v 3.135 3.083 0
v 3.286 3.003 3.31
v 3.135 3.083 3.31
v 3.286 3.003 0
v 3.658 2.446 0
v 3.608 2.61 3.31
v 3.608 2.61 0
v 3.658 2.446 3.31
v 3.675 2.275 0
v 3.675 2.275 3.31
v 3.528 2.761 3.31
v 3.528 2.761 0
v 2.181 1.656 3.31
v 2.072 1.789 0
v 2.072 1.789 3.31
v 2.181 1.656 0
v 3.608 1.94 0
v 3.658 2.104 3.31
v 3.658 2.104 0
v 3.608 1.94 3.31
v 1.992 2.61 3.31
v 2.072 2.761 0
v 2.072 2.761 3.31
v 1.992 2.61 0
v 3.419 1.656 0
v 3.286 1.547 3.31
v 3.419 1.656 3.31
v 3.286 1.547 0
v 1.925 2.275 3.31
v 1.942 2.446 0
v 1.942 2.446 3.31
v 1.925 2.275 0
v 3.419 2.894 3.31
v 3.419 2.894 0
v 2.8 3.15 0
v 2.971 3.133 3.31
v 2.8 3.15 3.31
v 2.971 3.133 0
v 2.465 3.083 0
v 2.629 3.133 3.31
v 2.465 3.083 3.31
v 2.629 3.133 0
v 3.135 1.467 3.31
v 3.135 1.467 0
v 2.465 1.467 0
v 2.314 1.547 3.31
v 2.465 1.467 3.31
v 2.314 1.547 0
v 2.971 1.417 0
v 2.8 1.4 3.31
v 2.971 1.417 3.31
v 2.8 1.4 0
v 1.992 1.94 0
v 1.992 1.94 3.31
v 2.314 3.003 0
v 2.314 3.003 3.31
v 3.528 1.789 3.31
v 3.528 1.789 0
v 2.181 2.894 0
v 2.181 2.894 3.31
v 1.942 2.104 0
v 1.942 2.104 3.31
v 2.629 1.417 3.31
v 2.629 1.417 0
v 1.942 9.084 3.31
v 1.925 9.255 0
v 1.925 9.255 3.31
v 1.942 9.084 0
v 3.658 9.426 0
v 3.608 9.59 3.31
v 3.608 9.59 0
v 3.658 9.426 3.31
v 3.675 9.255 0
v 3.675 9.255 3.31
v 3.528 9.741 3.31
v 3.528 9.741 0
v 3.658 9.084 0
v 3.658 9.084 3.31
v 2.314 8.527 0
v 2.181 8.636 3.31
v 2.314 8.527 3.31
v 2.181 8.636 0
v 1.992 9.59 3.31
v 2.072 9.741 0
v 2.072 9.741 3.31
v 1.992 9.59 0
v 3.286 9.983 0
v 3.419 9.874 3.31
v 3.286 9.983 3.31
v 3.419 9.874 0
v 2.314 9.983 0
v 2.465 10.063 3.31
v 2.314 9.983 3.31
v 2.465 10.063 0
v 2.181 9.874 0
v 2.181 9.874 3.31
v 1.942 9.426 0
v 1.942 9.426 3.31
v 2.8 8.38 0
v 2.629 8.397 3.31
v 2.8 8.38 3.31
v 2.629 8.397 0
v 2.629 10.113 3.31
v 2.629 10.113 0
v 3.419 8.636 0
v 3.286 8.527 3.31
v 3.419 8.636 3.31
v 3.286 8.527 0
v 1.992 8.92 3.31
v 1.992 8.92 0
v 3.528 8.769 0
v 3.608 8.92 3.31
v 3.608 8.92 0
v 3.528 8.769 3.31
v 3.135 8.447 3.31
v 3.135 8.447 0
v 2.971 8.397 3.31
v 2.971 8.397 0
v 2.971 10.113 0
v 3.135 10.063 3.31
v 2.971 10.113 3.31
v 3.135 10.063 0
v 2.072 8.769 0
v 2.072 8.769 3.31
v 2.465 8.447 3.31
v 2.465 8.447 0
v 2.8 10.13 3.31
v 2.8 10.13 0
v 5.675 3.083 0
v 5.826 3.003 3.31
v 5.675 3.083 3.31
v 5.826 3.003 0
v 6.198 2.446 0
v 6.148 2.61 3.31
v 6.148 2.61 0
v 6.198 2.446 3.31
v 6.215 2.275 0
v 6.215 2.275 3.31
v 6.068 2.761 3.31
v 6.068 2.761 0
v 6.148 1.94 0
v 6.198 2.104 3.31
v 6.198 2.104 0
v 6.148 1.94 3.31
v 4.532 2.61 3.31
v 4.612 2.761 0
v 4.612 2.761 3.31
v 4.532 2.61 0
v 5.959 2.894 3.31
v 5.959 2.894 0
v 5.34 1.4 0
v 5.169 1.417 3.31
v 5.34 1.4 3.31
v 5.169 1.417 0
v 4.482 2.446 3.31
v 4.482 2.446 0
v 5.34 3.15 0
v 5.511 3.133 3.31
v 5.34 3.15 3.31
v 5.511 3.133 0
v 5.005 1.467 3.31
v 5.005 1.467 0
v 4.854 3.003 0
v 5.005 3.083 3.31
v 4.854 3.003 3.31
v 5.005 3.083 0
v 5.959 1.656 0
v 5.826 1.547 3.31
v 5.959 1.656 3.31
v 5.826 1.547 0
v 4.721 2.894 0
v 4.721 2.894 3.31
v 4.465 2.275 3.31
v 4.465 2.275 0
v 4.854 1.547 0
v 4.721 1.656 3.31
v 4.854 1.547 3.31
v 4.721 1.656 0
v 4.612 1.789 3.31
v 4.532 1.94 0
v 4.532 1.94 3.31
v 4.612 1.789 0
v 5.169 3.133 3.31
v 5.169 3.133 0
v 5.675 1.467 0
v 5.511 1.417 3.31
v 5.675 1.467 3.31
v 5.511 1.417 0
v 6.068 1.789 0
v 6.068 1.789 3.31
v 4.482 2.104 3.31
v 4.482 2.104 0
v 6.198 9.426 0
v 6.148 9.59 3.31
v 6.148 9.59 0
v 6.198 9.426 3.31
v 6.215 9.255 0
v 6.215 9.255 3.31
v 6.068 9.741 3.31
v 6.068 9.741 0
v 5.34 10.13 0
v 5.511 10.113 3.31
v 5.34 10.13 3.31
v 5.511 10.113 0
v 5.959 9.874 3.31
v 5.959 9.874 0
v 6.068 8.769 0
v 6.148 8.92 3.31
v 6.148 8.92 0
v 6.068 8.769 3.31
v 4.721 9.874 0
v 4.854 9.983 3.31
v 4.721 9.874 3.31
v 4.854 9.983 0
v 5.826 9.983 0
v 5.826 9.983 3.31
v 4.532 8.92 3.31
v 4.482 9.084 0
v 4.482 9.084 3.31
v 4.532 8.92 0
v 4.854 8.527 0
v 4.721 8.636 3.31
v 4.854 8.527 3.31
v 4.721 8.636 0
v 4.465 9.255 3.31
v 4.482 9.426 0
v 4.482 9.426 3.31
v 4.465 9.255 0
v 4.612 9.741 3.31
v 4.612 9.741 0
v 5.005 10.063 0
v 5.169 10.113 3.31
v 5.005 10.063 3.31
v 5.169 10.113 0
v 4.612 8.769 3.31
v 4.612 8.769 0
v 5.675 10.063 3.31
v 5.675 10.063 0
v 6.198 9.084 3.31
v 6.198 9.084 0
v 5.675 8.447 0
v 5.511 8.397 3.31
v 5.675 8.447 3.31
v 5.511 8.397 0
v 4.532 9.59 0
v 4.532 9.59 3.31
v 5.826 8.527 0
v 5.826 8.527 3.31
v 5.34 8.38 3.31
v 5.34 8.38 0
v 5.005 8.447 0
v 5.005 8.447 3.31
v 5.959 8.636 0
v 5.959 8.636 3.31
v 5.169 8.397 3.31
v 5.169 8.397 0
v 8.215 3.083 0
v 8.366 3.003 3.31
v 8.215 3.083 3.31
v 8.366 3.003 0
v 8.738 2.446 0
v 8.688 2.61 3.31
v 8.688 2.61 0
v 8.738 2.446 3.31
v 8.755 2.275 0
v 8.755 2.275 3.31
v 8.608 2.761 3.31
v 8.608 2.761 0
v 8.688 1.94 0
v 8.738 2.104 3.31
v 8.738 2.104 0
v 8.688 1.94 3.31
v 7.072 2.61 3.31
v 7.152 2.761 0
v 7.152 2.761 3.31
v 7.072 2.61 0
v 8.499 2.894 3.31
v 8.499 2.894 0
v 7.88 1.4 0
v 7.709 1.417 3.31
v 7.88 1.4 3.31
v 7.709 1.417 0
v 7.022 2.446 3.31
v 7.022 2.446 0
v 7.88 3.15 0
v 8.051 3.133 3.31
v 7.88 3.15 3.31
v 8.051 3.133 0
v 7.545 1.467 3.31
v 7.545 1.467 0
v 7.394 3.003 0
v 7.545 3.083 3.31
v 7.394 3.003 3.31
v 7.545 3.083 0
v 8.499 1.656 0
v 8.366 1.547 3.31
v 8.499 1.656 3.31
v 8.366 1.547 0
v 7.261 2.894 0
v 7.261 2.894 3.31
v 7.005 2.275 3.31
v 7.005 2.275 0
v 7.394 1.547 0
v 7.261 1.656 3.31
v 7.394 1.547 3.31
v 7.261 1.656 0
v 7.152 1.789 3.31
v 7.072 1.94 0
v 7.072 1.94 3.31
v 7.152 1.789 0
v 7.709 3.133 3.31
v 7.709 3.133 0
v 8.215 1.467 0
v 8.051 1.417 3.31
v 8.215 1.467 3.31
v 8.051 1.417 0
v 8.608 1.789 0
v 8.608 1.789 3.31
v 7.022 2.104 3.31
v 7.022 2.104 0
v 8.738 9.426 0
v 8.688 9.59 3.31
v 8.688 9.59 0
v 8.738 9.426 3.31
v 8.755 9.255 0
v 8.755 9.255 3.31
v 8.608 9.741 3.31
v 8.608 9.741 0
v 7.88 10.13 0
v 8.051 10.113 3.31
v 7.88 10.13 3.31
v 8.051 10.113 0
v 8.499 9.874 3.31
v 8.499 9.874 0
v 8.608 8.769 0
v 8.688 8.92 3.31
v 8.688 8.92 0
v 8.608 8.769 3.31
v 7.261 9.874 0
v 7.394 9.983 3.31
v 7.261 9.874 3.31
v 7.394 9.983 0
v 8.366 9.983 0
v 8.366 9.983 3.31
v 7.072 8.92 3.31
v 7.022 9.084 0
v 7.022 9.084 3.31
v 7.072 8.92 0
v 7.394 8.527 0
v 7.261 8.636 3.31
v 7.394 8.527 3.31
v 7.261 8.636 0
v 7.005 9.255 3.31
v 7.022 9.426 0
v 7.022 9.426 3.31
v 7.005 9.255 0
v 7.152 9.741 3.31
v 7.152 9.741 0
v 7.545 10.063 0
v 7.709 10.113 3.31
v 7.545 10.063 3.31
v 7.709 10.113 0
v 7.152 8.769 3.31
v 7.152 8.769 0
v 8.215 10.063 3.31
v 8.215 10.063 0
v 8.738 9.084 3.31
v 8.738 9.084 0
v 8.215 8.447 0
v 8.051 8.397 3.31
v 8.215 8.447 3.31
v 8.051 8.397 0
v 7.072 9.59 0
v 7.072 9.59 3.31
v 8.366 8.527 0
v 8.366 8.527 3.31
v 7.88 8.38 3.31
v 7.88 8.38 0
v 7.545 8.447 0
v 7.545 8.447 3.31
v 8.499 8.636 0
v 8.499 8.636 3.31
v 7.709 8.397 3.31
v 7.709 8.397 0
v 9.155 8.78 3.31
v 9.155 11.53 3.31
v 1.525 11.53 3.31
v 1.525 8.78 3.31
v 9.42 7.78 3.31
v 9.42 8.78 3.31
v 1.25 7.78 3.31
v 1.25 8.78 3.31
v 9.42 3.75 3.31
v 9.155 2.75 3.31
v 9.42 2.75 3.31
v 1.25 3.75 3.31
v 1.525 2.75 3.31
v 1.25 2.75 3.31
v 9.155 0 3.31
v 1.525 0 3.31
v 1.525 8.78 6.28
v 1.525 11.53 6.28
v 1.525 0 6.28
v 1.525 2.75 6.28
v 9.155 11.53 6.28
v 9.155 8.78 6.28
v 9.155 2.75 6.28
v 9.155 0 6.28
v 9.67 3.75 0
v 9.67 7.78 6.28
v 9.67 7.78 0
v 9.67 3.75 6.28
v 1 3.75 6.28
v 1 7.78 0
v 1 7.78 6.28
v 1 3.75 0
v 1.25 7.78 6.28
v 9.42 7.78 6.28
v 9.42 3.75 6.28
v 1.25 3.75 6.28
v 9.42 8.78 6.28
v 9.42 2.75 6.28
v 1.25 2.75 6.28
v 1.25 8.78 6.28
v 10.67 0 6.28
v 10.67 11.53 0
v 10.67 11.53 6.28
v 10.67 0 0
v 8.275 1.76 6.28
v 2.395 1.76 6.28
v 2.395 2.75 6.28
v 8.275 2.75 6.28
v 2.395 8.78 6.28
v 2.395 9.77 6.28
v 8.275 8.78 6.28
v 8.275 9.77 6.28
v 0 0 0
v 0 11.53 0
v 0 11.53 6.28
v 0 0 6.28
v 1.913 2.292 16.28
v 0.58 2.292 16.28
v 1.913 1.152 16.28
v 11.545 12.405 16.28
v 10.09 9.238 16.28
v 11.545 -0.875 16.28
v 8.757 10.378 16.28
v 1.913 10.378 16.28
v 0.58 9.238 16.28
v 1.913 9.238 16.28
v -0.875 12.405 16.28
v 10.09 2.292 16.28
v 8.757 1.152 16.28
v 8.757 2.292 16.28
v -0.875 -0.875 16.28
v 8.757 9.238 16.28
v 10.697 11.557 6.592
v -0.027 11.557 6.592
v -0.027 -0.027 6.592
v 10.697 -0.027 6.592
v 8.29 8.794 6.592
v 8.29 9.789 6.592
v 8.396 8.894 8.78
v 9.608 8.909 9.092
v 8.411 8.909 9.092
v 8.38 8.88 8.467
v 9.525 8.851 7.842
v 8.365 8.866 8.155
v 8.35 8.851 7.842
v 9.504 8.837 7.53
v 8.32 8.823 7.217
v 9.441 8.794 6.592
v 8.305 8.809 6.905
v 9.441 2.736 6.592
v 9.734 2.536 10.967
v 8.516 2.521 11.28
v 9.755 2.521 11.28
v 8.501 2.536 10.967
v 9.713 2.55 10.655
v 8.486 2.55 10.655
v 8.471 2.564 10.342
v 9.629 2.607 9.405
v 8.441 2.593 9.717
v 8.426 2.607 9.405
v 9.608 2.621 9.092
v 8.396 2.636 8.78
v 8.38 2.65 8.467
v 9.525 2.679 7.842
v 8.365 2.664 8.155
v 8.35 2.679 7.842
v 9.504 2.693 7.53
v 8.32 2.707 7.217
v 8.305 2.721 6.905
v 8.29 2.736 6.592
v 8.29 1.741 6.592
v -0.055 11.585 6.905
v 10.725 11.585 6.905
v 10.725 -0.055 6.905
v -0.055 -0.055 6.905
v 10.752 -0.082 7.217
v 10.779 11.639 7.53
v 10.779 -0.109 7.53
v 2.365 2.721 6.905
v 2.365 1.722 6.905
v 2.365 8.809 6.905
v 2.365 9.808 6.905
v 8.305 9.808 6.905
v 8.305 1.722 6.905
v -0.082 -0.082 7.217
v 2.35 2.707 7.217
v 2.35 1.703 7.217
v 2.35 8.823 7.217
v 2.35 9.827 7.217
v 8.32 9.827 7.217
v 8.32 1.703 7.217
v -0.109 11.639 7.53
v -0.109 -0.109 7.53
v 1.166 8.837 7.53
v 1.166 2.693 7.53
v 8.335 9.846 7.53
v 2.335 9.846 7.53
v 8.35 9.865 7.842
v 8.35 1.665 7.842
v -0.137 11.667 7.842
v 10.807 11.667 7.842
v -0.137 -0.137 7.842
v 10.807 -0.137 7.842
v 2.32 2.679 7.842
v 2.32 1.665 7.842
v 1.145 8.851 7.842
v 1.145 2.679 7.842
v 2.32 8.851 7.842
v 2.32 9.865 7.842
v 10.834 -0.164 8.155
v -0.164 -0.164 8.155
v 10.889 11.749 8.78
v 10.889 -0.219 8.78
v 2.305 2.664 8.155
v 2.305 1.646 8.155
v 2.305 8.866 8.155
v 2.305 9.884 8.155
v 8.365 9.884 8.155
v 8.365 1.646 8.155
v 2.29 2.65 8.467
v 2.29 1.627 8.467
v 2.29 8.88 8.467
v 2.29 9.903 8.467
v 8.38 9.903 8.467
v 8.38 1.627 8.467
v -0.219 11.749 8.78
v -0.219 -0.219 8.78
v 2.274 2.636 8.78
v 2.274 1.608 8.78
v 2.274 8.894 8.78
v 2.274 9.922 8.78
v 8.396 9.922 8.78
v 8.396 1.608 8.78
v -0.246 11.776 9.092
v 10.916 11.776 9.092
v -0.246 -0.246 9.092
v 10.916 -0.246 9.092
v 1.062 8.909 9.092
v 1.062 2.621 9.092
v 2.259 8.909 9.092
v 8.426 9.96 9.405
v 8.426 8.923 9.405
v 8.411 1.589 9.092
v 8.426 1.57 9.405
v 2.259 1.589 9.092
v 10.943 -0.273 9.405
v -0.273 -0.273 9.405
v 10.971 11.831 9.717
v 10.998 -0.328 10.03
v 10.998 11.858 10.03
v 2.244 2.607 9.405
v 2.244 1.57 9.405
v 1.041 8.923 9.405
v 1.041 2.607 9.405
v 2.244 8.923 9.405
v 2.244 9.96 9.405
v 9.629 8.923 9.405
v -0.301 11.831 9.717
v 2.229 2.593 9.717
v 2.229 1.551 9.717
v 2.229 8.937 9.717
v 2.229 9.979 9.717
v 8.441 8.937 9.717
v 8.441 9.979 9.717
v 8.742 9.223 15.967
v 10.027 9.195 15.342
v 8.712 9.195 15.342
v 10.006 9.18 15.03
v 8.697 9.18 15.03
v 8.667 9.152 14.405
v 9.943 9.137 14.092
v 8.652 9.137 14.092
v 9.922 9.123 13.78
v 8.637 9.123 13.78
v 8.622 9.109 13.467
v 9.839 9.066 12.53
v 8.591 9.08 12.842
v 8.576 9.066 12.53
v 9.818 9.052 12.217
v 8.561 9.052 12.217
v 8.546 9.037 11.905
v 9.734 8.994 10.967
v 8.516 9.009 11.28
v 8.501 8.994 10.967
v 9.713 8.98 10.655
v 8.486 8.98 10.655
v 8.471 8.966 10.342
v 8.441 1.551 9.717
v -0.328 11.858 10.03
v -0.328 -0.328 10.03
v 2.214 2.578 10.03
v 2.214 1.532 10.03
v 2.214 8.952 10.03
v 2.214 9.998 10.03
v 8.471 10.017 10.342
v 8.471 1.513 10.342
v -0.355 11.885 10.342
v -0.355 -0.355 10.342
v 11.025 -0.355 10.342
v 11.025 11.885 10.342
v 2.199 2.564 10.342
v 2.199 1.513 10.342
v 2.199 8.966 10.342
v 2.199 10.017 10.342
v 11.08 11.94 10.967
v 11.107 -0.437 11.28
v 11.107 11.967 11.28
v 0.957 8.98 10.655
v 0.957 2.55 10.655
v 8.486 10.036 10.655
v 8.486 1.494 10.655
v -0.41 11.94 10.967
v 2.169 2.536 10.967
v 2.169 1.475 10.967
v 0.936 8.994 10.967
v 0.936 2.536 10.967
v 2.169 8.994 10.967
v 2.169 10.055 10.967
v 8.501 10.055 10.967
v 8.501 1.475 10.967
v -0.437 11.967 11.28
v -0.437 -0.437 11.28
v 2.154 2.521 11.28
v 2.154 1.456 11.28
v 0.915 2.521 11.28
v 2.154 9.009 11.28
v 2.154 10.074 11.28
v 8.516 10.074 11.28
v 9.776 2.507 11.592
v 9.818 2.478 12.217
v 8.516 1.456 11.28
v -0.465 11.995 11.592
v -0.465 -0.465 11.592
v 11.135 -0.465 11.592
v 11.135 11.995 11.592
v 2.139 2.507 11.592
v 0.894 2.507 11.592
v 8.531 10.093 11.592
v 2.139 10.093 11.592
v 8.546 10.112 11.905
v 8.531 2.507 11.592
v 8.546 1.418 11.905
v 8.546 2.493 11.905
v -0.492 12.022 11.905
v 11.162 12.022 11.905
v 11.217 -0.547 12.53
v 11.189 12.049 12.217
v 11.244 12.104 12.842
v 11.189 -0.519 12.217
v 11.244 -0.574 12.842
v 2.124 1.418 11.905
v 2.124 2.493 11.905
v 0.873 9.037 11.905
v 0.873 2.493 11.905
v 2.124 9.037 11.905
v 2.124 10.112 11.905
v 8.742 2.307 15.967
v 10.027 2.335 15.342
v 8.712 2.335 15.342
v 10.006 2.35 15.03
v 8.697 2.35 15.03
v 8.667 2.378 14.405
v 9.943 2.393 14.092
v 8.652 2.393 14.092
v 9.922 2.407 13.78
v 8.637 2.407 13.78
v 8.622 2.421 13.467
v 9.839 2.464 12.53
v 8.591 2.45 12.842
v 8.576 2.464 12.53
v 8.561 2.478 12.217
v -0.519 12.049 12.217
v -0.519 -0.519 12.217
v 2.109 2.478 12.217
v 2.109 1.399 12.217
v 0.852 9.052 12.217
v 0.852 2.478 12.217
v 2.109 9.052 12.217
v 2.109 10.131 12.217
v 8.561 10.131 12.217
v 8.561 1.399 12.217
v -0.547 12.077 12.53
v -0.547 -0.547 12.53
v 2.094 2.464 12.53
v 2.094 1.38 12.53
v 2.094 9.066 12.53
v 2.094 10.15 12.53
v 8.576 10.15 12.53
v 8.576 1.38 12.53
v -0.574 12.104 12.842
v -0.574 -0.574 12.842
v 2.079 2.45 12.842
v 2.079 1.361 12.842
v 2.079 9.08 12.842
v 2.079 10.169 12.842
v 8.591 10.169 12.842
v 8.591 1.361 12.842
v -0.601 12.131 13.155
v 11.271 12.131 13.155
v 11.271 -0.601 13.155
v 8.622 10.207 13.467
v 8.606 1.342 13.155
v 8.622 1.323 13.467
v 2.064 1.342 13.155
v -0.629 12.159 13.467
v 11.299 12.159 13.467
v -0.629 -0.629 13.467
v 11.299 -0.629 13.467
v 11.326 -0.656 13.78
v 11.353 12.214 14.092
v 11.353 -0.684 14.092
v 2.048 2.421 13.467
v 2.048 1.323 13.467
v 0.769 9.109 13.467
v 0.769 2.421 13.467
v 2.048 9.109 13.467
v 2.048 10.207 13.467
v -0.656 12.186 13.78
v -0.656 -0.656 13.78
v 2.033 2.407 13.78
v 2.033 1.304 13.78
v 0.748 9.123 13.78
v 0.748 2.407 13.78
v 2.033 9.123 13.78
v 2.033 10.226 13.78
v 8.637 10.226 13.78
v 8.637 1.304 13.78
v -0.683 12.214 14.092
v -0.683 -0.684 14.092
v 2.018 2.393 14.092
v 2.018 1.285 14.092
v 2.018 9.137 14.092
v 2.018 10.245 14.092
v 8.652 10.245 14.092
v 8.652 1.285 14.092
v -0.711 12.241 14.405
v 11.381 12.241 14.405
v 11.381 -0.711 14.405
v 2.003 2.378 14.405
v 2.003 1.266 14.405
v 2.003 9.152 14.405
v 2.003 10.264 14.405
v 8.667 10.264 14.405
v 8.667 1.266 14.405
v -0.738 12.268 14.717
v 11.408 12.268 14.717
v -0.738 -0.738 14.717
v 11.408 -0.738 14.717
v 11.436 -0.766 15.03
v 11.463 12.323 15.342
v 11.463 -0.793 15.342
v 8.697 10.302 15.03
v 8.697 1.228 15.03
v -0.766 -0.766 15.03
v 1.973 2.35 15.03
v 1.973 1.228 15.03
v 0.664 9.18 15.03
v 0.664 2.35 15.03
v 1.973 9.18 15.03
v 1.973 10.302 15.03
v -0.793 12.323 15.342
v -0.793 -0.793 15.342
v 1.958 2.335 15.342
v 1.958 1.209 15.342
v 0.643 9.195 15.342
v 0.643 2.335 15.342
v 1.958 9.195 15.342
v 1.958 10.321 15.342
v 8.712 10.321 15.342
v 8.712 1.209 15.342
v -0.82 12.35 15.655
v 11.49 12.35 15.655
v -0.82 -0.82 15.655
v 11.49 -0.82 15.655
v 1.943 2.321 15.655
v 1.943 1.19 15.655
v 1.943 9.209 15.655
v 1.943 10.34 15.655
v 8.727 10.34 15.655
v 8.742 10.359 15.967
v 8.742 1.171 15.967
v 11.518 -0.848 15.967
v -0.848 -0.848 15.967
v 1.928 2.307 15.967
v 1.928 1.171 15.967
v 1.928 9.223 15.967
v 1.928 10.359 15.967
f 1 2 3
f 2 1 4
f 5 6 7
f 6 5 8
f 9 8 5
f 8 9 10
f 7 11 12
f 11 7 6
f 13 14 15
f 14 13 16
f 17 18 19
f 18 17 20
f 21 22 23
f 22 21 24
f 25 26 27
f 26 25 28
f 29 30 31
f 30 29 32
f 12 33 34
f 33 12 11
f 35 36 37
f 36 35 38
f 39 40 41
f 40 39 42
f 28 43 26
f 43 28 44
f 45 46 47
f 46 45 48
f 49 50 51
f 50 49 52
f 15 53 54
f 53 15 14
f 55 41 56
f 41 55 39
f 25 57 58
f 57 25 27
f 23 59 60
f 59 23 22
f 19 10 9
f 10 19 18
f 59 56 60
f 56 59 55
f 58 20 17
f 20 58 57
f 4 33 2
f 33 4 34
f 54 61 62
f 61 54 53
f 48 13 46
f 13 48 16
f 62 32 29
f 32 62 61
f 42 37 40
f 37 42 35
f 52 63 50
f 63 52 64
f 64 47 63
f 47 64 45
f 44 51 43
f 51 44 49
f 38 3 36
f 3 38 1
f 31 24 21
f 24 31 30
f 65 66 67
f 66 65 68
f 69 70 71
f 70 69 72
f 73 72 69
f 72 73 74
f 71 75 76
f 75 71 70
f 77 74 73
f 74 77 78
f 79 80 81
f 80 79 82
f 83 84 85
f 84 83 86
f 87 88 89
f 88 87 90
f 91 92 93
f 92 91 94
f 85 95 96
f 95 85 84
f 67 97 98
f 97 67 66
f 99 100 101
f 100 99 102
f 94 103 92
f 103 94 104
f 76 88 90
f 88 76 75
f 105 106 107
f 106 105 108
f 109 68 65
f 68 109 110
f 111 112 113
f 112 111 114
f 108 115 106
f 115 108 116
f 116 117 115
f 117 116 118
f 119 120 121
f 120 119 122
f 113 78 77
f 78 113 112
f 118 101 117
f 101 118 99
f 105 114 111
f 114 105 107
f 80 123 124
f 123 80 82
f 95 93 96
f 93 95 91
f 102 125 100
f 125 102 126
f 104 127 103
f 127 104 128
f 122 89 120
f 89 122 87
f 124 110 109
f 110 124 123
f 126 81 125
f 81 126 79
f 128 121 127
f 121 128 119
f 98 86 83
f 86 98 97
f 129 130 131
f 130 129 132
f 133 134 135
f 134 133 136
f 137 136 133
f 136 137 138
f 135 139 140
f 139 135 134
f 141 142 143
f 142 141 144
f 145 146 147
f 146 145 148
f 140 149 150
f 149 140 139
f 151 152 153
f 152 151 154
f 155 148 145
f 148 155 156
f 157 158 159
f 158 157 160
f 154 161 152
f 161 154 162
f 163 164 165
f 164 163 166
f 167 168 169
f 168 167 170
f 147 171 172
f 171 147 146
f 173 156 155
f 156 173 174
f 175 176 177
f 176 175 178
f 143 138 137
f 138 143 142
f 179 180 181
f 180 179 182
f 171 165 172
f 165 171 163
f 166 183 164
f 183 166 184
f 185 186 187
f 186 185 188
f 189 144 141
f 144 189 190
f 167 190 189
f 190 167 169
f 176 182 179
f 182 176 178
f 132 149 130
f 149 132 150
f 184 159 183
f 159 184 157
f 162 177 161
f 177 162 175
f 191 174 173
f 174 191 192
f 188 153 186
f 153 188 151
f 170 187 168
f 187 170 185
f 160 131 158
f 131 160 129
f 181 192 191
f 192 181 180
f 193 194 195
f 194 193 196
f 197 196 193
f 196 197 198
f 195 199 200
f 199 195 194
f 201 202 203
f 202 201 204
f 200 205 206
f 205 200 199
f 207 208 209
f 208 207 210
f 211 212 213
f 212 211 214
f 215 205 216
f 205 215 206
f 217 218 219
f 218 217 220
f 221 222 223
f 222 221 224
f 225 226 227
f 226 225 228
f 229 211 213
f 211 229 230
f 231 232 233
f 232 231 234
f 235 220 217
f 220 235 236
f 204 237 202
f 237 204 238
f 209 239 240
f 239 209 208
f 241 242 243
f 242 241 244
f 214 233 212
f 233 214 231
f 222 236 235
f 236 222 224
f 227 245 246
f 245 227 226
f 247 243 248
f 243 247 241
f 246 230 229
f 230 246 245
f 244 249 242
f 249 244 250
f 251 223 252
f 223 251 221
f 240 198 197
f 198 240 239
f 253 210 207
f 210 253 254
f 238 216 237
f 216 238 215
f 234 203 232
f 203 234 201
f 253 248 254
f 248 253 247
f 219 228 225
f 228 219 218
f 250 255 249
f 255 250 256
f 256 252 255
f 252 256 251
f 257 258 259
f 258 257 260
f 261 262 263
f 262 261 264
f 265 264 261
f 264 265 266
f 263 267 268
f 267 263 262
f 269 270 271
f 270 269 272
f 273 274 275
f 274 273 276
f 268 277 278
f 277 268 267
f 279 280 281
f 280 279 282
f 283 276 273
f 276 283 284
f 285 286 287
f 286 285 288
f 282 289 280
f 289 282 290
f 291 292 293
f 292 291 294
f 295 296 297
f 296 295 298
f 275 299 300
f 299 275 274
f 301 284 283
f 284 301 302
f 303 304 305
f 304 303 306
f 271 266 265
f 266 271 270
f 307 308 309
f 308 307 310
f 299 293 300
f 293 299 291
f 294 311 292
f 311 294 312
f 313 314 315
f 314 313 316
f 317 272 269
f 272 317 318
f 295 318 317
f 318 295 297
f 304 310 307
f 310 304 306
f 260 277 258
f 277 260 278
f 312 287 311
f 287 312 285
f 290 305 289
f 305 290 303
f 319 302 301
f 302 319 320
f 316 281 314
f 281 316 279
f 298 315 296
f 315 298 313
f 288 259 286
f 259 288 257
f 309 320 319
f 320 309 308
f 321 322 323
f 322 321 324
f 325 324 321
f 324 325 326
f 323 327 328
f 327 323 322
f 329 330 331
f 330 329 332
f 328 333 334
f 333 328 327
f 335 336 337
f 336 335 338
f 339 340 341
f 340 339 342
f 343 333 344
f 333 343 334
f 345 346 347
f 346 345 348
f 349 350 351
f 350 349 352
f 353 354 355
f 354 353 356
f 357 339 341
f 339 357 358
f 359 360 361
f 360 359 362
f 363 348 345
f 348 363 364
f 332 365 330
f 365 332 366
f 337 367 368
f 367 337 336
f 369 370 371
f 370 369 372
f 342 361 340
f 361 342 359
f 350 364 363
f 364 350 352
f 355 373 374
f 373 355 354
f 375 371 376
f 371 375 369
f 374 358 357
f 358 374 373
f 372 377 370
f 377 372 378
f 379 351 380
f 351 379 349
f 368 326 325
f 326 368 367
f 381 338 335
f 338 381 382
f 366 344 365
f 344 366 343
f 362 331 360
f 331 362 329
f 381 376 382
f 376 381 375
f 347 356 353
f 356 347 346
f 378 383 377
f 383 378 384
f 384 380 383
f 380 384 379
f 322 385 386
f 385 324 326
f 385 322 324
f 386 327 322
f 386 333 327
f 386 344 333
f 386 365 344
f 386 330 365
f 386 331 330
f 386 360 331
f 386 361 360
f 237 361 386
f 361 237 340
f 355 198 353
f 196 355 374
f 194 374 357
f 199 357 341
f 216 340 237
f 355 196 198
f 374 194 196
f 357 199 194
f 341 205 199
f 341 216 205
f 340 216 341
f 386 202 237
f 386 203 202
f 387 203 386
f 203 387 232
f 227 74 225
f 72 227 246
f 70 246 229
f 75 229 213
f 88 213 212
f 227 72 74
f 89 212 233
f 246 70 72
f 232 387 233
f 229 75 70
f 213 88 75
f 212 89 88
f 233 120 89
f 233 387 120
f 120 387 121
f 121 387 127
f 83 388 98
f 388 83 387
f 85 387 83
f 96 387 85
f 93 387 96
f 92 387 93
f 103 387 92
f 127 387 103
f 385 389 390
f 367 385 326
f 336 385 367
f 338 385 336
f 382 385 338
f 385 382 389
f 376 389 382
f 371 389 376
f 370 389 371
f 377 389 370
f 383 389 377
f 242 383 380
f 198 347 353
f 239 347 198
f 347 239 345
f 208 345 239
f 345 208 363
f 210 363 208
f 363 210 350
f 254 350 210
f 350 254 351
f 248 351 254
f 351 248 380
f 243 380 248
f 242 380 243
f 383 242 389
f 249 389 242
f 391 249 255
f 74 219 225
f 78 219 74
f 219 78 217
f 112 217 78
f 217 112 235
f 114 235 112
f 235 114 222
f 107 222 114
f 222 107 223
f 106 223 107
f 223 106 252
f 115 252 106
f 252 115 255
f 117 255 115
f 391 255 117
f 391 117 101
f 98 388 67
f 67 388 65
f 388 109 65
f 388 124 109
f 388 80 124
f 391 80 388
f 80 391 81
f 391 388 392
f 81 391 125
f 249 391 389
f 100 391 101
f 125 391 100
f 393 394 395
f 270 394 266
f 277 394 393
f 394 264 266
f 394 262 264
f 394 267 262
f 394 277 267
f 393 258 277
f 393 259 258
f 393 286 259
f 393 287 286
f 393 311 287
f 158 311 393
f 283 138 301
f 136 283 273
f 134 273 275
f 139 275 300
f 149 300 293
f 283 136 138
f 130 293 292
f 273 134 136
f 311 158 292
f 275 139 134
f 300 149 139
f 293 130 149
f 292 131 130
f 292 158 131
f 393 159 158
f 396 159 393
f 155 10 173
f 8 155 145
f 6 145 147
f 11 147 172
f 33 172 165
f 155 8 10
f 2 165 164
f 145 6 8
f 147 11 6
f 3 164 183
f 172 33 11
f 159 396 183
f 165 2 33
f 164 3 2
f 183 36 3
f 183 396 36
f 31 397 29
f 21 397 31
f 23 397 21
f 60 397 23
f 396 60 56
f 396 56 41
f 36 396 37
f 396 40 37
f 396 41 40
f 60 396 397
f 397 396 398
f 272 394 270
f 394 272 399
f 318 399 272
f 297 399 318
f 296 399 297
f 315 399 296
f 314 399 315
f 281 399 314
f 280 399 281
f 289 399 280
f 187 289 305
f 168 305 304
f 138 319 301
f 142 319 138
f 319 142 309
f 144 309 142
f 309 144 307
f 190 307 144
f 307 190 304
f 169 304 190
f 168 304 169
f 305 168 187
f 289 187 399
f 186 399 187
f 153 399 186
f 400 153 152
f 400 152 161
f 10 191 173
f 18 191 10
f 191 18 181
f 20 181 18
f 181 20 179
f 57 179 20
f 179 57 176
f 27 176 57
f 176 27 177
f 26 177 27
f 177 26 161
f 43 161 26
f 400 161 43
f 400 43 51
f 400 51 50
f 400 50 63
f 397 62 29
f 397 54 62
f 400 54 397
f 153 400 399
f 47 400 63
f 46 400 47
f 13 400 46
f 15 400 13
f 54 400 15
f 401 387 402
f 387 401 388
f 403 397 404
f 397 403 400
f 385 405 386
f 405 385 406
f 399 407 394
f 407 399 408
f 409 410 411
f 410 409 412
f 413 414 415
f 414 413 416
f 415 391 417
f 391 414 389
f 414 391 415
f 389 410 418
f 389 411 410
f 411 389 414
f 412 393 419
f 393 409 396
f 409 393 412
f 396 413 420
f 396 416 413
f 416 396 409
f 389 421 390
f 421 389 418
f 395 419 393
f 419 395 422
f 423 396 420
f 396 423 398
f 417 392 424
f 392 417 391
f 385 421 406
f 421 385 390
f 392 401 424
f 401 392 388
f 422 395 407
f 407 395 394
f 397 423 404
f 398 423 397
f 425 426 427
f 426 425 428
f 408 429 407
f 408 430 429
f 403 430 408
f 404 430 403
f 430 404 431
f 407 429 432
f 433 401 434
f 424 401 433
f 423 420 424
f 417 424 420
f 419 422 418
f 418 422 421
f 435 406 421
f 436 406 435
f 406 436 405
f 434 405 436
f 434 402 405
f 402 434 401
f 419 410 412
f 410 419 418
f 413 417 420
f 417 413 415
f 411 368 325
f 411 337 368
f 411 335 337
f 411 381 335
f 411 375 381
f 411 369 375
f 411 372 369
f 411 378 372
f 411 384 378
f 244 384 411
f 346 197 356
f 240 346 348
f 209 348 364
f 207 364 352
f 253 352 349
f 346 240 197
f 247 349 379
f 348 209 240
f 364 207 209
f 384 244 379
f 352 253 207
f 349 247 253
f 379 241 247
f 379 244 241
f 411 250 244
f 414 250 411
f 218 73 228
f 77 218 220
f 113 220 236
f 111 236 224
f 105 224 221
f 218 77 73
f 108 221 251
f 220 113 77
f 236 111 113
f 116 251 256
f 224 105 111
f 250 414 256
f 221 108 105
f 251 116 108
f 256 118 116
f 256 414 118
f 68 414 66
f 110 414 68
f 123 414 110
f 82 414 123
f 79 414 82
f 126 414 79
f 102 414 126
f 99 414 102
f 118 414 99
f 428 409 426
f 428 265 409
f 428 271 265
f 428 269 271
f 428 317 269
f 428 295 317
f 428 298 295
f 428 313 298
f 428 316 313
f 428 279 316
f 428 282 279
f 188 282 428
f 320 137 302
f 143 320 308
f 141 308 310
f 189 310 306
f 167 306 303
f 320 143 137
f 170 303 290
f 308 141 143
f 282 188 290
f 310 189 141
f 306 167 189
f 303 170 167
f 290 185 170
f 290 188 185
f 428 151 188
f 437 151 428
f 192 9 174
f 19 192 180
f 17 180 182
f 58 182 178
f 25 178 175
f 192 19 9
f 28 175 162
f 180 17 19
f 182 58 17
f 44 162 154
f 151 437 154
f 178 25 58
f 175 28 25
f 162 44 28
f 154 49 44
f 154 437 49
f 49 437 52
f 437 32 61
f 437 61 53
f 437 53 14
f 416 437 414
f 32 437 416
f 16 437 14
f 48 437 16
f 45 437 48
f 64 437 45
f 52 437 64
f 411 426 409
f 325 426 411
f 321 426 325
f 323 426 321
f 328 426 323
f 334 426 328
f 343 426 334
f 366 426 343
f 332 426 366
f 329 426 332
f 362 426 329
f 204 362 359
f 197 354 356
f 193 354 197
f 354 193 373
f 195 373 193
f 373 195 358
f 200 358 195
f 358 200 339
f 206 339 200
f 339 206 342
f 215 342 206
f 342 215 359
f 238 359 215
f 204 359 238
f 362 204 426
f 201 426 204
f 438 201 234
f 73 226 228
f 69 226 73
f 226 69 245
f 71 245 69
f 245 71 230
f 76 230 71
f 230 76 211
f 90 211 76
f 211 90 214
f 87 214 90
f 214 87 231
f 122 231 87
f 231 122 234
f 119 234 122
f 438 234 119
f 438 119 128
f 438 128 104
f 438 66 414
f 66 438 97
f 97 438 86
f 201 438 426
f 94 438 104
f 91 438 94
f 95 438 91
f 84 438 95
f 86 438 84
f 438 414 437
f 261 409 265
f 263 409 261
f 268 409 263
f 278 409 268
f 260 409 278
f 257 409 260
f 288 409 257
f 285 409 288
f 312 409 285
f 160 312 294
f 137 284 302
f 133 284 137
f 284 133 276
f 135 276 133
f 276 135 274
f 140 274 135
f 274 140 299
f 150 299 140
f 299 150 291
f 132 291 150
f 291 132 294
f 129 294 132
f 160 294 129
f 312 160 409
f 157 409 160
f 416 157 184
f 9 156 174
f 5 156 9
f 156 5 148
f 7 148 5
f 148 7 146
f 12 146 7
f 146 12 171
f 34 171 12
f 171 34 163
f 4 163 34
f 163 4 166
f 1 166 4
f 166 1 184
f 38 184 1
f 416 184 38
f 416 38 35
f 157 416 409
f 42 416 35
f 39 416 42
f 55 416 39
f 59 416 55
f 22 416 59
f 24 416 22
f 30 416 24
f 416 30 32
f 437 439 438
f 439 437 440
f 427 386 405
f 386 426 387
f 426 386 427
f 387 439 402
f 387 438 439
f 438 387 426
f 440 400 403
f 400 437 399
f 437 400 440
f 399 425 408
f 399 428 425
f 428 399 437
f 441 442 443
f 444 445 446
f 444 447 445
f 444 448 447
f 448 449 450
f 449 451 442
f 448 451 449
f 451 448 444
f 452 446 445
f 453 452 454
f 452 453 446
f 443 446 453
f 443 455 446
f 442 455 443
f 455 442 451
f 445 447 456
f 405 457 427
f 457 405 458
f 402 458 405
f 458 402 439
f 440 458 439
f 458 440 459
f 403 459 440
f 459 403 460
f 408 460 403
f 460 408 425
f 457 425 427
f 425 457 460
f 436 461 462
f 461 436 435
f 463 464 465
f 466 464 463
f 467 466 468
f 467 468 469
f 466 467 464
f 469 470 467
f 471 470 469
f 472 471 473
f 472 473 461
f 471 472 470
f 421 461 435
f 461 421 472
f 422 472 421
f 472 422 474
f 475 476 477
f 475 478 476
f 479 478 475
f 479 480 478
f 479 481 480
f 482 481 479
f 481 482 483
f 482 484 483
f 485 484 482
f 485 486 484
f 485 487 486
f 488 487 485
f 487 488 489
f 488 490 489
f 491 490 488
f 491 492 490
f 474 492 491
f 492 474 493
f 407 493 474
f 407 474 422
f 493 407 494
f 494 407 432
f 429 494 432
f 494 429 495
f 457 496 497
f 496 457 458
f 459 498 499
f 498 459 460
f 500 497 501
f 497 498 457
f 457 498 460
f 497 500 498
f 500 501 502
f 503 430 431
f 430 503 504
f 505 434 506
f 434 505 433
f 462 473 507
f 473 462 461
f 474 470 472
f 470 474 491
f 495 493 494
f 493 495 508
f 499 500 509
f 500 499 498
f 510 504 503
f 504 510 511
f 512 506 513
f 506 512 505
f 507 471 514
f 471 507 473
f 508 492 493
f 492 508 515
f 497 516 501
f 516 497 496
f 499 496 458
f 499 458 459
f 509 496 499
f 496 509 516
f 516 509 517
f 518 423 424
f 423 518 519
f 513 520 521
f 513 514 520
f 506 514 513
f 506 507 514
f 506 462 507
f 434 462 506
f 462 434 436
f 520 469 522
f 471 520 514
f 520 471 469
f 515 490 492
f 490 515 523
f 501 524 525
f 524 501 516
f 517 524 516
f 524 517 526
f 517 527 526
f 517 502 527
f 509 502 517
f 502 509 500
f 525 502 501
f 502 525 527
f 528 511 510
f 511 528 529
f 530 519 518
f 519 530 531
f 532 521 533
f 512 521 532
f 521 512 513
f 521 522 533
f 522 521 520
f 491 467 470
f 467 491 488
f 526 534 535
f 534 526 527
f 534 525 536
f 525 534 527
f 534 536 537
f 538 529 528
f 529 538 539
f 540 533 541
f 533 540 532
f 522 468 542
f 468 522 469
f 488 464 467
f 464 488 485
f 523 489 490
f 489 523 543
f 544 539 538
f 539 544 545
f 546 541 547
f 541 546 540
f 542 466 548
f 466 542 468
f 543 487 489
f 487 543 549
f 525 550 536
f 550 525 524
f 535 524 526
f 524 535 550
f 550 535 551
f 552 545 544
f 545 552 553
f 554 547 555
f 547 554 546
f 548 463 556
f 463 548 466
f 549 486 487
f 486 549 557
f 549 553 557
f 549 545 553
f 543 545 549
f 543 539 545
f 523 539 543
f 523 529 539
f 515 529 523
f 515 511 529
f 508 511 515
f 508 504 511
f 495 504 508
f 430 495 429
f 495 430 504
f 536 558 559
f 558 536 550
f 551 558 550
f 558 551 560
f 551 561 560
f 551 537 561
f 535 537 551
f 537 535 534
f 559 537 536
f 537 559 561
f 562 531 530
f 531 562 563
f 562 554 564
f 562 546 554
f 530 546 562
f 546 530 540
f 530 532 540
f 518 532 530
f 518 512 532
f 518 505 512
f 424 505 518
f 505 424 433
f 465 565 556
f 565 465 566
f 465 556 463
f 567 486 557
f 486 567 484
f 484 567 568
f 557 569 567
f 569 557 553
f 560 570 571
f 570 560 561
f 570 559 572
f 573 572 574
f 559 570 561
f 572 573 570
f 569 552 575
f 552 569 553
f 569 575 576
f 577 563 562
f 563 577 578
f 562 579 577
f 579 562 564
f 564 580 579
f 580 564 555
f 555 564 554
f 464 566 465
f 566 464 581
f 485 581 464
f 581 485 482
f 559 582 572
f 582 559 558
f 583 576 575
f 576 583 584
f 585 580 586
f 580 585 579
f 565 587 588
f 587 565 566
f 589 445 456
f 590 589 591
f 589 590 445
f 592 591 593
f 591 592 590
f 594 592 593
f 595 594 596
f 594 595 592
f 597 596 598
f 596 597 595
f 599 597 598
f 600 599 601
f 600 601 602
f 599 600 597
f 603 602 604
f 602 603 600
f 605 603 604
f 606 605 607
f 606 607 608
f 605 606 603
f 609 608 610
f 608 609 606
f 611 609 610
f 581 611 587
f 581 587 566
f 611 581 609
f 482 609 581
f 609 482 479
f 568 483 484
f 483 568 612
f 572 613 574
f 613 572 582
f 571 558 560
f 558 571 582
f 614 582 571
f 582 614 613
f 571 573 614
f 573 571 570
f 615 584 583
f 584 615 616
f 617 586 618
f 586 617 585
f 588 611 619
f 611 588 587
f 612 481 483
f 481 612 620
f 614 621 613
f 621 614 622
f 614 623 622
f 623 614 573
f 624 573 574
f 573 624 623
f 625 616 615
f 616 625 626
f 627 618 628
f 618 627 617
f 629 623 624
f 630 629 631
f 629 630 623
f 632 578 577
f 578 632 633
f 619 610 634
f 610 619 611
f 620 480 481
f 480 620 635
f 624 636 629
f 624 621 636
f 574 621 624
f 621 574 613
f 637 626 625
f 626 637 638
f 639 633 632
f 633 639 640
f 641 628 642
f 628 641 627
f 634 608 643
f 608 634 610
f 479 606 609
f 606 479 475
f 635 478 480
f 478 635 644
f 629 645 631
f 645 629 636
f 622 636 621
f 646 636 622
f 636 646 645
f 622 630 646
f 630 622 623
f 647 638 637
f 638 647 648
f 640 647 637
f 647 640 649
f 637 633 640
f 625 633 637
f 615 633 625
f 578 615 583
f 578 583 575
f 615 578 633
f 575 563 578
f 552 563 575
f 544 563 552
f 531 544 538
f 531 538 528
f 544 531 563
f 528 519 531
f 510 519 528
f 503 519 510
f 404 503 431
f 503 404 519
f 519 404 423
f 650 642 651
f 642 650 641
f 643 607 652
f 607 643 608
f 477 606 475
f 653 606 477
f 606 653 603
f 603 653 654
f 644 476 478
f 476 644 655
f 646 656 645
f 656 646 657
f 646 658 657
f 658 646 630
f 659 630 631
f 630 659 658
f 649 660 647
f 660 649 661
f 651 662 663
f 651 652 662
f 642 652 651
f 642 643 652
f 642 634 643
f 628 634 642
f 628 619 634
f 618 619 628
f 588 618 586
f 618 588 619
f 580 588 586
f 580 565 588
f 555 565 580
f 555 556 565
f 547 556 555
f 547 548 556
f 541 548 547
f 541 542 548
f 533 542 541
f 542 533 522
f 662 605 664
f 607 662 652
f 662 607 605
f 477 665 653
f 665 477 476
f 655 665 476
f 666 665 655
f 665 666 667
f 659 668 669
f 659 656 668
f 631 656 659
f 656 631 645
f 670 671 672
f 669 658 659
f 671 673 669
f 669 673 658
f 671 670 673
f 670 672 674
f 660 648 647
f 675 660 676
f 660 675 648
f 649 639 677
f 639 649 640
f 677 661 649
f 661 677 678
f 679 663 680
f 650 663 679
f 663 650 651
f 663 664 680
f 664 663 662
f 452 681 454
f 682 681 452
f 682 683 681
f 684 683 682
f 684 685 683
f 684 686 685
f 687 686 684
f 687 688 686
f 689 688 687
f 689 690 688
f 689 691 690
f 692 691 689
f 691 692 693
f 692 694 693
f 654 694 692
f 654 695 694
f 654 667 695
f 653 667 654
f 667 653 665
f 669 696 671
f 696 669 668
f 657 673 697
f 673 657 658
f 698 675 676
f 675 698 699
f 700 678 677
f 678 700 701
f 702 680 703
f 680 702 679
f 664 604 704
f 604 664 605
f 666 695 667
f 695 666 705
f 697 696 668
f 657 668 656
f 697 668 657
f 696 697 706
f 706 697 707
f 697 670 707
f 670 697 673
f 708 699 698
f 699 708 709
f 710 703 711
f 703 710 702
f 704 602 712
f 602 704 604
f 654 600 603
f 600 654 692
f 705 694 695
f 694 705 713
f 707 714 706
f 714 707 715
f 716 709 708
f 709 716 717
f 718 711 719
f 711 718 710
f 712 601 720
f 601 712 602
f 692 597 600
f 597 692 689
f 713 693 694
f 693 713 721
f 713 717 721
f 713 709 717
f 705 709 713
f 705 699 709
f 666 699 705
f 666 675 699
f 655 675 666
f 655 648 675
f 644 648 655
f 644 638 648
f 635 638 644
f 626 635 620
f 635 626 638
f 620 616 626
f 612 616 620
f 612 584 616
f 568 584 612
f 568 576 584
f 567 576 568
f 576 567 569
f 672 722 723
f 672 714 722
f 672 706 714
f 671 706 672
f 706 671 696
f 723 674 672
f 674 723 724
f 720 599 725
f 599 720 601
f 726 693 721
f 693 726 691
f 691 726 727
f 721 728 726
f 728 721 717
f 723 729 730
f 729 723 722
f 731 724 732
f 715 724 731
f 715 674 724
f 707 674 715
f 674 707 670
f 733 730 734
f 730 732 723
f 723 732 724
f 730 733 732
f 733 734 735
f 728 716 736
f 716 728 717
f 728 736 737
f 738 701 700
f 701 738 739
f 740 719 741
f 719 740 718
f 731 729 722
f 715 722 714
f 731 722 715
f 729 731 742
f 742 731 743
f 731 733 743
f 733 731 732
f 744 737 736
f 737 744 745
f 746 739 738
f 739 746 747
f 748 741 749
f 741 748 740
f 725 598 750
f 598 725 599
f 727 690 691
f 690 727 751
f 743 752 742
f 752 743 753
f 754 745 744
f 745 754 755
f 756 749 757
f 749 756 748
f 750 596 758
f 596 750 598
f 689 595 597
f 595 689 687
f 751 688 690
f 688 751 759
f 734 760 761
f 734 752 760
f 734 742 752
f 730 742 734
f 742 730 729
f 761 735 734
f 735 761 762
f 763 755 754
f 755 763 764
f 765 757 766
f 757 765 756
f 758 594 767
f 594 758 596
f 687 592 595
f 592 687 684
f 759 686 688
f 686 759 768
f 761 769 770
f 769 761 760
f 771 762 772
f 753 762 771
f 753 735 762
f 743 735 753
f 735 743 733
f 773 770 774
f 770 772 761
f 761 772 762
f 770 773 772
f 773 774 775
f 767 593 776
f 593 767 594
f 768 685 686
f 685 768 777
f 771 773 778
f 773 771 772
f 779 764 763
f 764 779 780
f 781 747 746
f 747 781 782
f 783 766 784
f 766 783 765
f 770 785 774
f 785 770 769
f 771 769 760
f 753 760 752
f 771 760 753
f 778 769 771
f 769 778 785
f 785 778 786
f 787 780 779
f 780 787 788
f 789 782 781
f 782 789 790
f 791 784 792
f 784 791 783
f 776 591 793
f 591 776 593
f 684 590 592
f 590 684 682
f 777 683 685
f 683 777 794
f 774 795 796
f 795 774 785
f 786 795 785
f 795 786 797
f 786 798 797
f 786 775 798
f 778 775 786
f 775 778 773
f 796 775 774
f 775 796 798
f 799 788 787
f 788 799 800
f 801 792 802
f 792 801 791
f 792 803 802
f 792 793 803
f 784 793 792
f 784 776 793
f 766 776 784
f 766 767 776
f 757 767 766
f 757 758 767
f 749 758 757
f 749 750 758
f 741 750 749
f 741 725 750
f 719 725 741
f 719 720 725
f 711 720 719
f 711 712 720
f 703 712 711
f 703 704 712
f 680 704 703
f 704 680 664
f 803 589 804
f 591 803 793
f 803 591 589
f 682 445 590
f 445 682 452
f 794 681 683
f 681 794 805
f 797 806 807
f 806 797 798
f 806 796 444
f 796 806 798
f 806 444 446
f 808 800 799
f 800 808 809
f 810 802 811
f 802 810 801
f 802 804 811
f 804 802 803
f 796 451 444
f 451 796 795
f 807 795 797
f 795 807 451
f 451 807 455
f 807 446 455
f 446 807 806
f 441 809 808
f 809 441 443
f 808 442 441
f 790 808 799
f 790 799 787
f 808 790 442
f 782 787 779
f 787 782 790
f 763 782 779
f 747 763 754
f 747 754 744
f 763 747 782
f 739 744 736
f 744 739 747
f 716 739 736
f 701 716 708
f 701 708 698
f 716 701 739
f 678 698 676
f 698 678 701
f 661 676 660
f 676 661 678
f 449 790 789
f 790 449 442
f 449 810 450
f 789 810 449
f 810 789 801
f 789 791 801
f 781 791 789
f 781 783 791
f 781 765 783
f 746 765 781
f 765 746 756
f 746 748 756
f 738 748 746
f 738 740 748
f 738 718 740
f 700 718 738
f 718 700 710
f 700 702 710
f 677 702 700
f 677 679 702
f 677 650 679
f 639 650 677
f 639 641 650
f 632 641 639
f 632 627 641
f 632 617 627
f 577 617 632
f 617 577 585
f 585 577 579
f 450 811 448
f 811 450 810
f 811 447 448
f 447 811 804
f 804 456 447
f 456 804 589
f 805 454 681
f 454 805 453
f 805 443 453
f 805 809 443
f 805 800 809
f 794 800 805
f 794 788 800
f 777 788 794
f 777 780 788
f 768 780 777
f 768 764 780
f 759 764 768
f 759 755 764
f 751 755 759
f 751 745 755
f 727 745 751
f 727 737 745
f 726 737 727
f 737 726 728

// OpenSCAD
//


//----VARIABLES----

//--Transformer Dimensions--

//The length of the transformer body(long side, x axis)
tLength=7.87;

//The width of the transformer body(short side, y axis)
tWidth=5.23;
//Width assigned to depth for interchangeable use in code
tDepth=tWidth;

//The height of the transformer(top to bottom, z axis)
tHeight=5.59;

//The width of the metal legs used for interfacing with the transformer
tpinWidth=0.76;

//The distance from one pin to the consecutive one
pinSpacing=0.75;

//The distance that the pins extrude from the side of the body
pinExtrusion=0.66;


//--Casing Dimensions--

//The depth that the surface that the legs rest on is indented from the top of the main chassis
//-Partially outdated after removal of individual pinslots
pinDepth=3;

//The width of the walls enclosing the transformer
//-Partially outdated after pogo holes added
wallWidth=1;

//--PGP related dimensions--

//Diameter of the main body of the pogo pin(the bit that gets inserted into the hole)
pogoDiameter=1.49;

//Diameter of the hole that the pogo pin is inserted into
pogoHoleDiameter=1.75;

//Length of the main body of the pogo pin, from top of lip to spring
pogoLength=3.3;//length of main body of pin

//where the pogo hole is positioned, 0 is on the outside of the inset, 1 is on the inside of the inset
pogoPositionRatio=0.7;

//The extra radius of the lip compared to the main body
pogoLipRadius=0.1;

//The height of the lip (could be considered the "thickness")
pogoLipHeight=0.5;

//The padding between the edge of a pogo hole and the pin barrier
//-Outdated since slot barriers removed, but still used in code
holePadding=0.76;

//slot on the bottom for protecting the bottom of the pogo pins from damage. set to 0 to disable this, reccommended set to pogostemlength+0.5
//-Not used when PCB's are soldered to board or PCB
pogoProtection=0.00;


//--Funnel--
funnelHeight = 10;
// Using an angle (e.g., 30 degrees) makes the slope constant 
// regardless of height changes.
funnelSlopeAngle = 5; 

// Funnel Derived Logic:
// tan(angle) = opposite / adjacent -> expansion = height * tan(angle)
funnelExpansion = funnelHeight * tan(funnelSlopeAngle);





//--Miscellaneous--
//negligible variable used to avoid Z-fighting
$tol=0.01;

//Resolution of cylinders/circles. Eqivalent to x-sided circle/prism
$fn=32;

//Required clearance between different parts to allow proper movement
//-Calibrated for the printer we used
$clear=0.4;

//==============
//DERIVED VARIABLES
//==============

//STATIC

//Whether or not to include an indent to fit the pogo pin lip
lip=false;

//the number of legs on each side of the transformer
numPins=3;

//Calculated absolute pin positions:
//Middle of each pin can be found with 1.4+2.54*pinNumber starting at pinNumber=0 so:
basePinLoc=[1.4,3.94,6.48];//coordinates on the base trasformer
extraPinOffset=wallWidth+$clear;
pinLoc=[1.4+extraPinOffset,3.94+extraPinOffset,6.48+extraPinOffset];


//top slot width for ensuring proper transformer length fit
topSlotWidth=tWidth+2*$clear;

//offset of the top slot from the origin in the x axis
topSlotOffset=0.5;

//Derived casing dimensions
//inner casing cavity(This is the main cavity in the middle of the chassis)
innerCasingLength=tLength+(2*$clear);
innerCasingWidth=tWidth+(2*$clear)-2;
innerCasingHeight=pogoLength+pogoProtection+pinDepth;

//Outer casing dimensions. Everything else is cut out of this
outerCasingLength=innerCasingLength+2*wallWidth;//Length of outer casing
outerCasingWidth=innerCasingWidth+2*(2*wallWidth+pogoHoleDiameter);//Depth of outer casing
outerCasingHeight=innerCasingHeight-2*$tol;//Height of outer casing

// We calculate scale as: (Original + 2*Expansion) / Original
// This is moved here so the module stays clean
funnelScaleX = (outerCasingLength + 2 * funnelExpansion) / outerCasingLength;
funnelScaleY = (outerCasingWidth + 2 * funnelExpansion) / outerCasingWidth;

//Main code for assembling the chassis

//Subtracting everything from the main block
difference()
{//Block defined by outer casing vars to subtract everything from
    
    cube([outerCasingLength,//Length of outer casing 
        outerCasingWidth, //Depth of outer casing
        outerCasingHeight]);//Height of outer casing
    
        echo(outerCasingHeight)//debugging
    
//Everything below this point is grouped then subtracted from the main block

{
//inner cube acting as main central cavity
    
//moving cube to correct position
translate([
    (outerCasingLength)/2-innerCasingLength/2,
    outerCasingWidth/2-innerCasingWidth/2,
    -$tol])
   //Creating cuboid
    cube([
    innerCasingLength,
    innerCasingWidth, 
    innerCasingHeight]);
    
//creating topslot for proper transformer fit
    translate([wallWidth+topSlotOffset/2,
    outerCasingWidth/2-topSlotWidth/2,
    outerCasingHeight-pinDepth+$tol*3])
    //creating topslot cuboid
    cube([innerCasingLength-topSlotOffset,
    topSlotWidth,
    pinDepth+$tol]);
    
//Looping through each pin pair
for (i = [0:(numPins-1)]){
    pinInset(i); //Create a pin inset for this pair
    pogoHoles(i,lip);}//Create pogo holes for this pair
}

}


//Abstracted modules from the main difference function

//Originally used to create pinslots for each pogo pin
//-Having been widened, there are no longer slots but the logic still works so is still in place
module pinInset(pinNum){
//define values for dimensions of the bars hollowing out the pin inset pair
width=pogoDiameter+pogoLipRadius*2+holePadding+0.1;
depth=outerCasingWidth+2*$tol;
height=pinDepth;

//bottominset(Pogo protection, not used when soldering to board or pcb)
translate([pinLoc[pinNum],
    (depth/2)-$tol,
    (height/2)-$tol])
    
    cube([width,
    depth,
    pogoProtection],center=true);
//topinset
translate([pinLoc[pinNum],
    (depth/2)-$tol,
    pogoLength+pogoProtection+height+$tol-height/2])
    
    cube([width,
    depth,
    height],
    center=true);
    }
    
//Creating holes for the pogo pins
//Takes params:
    //pinNum(int) 0->2 for which pin the holes are being made for
    //includeLip(bool) whether or not to include an indent in the bottom to fit the lip
module pogoHoles(pinNum,includeLip){
    
    pinInsetWidth=pogoDiameter+pogoLipRadius*2+holePadding;
    radius=pogoHoleDiameter/2;
    height=5*outerCasingHeight;//arbitrary amount more than the outer transformer casing to make sure the hole goes all the way through
    
    
    translate([
    pinLoc[pinNum],
    (radius+wallWidth*2*pogoPositionRatio),
    height/2-$tol]){
        cylinder(h=height,r=radius,center=true);
    
    if(includeLip){
        translate([
        0,
        0,
        -(height/2)+pogoProtection])
        
            cylinder(h=pogoLipHeight,r=pogoLipRadius,center=true);
        }}
    
    translate([pinLoc[pinNum],outerCasingWidth-(radius+wallWidth*2*pogoPositionRatio),height/2-$tol]){
        cylinder(h=height,r=radius,center=true);
        if(includeLip){
        translate([0,0,-(height/2)+pogoProtection])
            cylinder(h=pogoLipHeight,r=pogoLipRadius+pogoDiameter/2,center=true);
        }}}

module funnel(){
    pinGapStart = pinLoc[0] - $clear;
    pinGapEnd = pinLoc[2] + $clear;
    funnelPinGapLength = pinGapEnd - pinGapStart;
        
    translate([outerCasingLength/2, outerCasingWidth/2, outerCasingHeight])
    // Uses the pre-calculated vector scale from the declarations
    linear_extrude(height = funnelHeight, scale = [funnelScaleX, funnelScaleY])
    {
        difference(){
            square([outerCasingLength, outerCasingWidth], center = true);
            
            union() {
                square([innerCasingLength - topSlotOffset, topSlotWidth], center = true);
                square([funnelPinGapLength, pinExtrusion + tWidth + 2 * pinExtrusion + 2 * $clear], center = true);
            }
        }    
    }
}
funnel();
